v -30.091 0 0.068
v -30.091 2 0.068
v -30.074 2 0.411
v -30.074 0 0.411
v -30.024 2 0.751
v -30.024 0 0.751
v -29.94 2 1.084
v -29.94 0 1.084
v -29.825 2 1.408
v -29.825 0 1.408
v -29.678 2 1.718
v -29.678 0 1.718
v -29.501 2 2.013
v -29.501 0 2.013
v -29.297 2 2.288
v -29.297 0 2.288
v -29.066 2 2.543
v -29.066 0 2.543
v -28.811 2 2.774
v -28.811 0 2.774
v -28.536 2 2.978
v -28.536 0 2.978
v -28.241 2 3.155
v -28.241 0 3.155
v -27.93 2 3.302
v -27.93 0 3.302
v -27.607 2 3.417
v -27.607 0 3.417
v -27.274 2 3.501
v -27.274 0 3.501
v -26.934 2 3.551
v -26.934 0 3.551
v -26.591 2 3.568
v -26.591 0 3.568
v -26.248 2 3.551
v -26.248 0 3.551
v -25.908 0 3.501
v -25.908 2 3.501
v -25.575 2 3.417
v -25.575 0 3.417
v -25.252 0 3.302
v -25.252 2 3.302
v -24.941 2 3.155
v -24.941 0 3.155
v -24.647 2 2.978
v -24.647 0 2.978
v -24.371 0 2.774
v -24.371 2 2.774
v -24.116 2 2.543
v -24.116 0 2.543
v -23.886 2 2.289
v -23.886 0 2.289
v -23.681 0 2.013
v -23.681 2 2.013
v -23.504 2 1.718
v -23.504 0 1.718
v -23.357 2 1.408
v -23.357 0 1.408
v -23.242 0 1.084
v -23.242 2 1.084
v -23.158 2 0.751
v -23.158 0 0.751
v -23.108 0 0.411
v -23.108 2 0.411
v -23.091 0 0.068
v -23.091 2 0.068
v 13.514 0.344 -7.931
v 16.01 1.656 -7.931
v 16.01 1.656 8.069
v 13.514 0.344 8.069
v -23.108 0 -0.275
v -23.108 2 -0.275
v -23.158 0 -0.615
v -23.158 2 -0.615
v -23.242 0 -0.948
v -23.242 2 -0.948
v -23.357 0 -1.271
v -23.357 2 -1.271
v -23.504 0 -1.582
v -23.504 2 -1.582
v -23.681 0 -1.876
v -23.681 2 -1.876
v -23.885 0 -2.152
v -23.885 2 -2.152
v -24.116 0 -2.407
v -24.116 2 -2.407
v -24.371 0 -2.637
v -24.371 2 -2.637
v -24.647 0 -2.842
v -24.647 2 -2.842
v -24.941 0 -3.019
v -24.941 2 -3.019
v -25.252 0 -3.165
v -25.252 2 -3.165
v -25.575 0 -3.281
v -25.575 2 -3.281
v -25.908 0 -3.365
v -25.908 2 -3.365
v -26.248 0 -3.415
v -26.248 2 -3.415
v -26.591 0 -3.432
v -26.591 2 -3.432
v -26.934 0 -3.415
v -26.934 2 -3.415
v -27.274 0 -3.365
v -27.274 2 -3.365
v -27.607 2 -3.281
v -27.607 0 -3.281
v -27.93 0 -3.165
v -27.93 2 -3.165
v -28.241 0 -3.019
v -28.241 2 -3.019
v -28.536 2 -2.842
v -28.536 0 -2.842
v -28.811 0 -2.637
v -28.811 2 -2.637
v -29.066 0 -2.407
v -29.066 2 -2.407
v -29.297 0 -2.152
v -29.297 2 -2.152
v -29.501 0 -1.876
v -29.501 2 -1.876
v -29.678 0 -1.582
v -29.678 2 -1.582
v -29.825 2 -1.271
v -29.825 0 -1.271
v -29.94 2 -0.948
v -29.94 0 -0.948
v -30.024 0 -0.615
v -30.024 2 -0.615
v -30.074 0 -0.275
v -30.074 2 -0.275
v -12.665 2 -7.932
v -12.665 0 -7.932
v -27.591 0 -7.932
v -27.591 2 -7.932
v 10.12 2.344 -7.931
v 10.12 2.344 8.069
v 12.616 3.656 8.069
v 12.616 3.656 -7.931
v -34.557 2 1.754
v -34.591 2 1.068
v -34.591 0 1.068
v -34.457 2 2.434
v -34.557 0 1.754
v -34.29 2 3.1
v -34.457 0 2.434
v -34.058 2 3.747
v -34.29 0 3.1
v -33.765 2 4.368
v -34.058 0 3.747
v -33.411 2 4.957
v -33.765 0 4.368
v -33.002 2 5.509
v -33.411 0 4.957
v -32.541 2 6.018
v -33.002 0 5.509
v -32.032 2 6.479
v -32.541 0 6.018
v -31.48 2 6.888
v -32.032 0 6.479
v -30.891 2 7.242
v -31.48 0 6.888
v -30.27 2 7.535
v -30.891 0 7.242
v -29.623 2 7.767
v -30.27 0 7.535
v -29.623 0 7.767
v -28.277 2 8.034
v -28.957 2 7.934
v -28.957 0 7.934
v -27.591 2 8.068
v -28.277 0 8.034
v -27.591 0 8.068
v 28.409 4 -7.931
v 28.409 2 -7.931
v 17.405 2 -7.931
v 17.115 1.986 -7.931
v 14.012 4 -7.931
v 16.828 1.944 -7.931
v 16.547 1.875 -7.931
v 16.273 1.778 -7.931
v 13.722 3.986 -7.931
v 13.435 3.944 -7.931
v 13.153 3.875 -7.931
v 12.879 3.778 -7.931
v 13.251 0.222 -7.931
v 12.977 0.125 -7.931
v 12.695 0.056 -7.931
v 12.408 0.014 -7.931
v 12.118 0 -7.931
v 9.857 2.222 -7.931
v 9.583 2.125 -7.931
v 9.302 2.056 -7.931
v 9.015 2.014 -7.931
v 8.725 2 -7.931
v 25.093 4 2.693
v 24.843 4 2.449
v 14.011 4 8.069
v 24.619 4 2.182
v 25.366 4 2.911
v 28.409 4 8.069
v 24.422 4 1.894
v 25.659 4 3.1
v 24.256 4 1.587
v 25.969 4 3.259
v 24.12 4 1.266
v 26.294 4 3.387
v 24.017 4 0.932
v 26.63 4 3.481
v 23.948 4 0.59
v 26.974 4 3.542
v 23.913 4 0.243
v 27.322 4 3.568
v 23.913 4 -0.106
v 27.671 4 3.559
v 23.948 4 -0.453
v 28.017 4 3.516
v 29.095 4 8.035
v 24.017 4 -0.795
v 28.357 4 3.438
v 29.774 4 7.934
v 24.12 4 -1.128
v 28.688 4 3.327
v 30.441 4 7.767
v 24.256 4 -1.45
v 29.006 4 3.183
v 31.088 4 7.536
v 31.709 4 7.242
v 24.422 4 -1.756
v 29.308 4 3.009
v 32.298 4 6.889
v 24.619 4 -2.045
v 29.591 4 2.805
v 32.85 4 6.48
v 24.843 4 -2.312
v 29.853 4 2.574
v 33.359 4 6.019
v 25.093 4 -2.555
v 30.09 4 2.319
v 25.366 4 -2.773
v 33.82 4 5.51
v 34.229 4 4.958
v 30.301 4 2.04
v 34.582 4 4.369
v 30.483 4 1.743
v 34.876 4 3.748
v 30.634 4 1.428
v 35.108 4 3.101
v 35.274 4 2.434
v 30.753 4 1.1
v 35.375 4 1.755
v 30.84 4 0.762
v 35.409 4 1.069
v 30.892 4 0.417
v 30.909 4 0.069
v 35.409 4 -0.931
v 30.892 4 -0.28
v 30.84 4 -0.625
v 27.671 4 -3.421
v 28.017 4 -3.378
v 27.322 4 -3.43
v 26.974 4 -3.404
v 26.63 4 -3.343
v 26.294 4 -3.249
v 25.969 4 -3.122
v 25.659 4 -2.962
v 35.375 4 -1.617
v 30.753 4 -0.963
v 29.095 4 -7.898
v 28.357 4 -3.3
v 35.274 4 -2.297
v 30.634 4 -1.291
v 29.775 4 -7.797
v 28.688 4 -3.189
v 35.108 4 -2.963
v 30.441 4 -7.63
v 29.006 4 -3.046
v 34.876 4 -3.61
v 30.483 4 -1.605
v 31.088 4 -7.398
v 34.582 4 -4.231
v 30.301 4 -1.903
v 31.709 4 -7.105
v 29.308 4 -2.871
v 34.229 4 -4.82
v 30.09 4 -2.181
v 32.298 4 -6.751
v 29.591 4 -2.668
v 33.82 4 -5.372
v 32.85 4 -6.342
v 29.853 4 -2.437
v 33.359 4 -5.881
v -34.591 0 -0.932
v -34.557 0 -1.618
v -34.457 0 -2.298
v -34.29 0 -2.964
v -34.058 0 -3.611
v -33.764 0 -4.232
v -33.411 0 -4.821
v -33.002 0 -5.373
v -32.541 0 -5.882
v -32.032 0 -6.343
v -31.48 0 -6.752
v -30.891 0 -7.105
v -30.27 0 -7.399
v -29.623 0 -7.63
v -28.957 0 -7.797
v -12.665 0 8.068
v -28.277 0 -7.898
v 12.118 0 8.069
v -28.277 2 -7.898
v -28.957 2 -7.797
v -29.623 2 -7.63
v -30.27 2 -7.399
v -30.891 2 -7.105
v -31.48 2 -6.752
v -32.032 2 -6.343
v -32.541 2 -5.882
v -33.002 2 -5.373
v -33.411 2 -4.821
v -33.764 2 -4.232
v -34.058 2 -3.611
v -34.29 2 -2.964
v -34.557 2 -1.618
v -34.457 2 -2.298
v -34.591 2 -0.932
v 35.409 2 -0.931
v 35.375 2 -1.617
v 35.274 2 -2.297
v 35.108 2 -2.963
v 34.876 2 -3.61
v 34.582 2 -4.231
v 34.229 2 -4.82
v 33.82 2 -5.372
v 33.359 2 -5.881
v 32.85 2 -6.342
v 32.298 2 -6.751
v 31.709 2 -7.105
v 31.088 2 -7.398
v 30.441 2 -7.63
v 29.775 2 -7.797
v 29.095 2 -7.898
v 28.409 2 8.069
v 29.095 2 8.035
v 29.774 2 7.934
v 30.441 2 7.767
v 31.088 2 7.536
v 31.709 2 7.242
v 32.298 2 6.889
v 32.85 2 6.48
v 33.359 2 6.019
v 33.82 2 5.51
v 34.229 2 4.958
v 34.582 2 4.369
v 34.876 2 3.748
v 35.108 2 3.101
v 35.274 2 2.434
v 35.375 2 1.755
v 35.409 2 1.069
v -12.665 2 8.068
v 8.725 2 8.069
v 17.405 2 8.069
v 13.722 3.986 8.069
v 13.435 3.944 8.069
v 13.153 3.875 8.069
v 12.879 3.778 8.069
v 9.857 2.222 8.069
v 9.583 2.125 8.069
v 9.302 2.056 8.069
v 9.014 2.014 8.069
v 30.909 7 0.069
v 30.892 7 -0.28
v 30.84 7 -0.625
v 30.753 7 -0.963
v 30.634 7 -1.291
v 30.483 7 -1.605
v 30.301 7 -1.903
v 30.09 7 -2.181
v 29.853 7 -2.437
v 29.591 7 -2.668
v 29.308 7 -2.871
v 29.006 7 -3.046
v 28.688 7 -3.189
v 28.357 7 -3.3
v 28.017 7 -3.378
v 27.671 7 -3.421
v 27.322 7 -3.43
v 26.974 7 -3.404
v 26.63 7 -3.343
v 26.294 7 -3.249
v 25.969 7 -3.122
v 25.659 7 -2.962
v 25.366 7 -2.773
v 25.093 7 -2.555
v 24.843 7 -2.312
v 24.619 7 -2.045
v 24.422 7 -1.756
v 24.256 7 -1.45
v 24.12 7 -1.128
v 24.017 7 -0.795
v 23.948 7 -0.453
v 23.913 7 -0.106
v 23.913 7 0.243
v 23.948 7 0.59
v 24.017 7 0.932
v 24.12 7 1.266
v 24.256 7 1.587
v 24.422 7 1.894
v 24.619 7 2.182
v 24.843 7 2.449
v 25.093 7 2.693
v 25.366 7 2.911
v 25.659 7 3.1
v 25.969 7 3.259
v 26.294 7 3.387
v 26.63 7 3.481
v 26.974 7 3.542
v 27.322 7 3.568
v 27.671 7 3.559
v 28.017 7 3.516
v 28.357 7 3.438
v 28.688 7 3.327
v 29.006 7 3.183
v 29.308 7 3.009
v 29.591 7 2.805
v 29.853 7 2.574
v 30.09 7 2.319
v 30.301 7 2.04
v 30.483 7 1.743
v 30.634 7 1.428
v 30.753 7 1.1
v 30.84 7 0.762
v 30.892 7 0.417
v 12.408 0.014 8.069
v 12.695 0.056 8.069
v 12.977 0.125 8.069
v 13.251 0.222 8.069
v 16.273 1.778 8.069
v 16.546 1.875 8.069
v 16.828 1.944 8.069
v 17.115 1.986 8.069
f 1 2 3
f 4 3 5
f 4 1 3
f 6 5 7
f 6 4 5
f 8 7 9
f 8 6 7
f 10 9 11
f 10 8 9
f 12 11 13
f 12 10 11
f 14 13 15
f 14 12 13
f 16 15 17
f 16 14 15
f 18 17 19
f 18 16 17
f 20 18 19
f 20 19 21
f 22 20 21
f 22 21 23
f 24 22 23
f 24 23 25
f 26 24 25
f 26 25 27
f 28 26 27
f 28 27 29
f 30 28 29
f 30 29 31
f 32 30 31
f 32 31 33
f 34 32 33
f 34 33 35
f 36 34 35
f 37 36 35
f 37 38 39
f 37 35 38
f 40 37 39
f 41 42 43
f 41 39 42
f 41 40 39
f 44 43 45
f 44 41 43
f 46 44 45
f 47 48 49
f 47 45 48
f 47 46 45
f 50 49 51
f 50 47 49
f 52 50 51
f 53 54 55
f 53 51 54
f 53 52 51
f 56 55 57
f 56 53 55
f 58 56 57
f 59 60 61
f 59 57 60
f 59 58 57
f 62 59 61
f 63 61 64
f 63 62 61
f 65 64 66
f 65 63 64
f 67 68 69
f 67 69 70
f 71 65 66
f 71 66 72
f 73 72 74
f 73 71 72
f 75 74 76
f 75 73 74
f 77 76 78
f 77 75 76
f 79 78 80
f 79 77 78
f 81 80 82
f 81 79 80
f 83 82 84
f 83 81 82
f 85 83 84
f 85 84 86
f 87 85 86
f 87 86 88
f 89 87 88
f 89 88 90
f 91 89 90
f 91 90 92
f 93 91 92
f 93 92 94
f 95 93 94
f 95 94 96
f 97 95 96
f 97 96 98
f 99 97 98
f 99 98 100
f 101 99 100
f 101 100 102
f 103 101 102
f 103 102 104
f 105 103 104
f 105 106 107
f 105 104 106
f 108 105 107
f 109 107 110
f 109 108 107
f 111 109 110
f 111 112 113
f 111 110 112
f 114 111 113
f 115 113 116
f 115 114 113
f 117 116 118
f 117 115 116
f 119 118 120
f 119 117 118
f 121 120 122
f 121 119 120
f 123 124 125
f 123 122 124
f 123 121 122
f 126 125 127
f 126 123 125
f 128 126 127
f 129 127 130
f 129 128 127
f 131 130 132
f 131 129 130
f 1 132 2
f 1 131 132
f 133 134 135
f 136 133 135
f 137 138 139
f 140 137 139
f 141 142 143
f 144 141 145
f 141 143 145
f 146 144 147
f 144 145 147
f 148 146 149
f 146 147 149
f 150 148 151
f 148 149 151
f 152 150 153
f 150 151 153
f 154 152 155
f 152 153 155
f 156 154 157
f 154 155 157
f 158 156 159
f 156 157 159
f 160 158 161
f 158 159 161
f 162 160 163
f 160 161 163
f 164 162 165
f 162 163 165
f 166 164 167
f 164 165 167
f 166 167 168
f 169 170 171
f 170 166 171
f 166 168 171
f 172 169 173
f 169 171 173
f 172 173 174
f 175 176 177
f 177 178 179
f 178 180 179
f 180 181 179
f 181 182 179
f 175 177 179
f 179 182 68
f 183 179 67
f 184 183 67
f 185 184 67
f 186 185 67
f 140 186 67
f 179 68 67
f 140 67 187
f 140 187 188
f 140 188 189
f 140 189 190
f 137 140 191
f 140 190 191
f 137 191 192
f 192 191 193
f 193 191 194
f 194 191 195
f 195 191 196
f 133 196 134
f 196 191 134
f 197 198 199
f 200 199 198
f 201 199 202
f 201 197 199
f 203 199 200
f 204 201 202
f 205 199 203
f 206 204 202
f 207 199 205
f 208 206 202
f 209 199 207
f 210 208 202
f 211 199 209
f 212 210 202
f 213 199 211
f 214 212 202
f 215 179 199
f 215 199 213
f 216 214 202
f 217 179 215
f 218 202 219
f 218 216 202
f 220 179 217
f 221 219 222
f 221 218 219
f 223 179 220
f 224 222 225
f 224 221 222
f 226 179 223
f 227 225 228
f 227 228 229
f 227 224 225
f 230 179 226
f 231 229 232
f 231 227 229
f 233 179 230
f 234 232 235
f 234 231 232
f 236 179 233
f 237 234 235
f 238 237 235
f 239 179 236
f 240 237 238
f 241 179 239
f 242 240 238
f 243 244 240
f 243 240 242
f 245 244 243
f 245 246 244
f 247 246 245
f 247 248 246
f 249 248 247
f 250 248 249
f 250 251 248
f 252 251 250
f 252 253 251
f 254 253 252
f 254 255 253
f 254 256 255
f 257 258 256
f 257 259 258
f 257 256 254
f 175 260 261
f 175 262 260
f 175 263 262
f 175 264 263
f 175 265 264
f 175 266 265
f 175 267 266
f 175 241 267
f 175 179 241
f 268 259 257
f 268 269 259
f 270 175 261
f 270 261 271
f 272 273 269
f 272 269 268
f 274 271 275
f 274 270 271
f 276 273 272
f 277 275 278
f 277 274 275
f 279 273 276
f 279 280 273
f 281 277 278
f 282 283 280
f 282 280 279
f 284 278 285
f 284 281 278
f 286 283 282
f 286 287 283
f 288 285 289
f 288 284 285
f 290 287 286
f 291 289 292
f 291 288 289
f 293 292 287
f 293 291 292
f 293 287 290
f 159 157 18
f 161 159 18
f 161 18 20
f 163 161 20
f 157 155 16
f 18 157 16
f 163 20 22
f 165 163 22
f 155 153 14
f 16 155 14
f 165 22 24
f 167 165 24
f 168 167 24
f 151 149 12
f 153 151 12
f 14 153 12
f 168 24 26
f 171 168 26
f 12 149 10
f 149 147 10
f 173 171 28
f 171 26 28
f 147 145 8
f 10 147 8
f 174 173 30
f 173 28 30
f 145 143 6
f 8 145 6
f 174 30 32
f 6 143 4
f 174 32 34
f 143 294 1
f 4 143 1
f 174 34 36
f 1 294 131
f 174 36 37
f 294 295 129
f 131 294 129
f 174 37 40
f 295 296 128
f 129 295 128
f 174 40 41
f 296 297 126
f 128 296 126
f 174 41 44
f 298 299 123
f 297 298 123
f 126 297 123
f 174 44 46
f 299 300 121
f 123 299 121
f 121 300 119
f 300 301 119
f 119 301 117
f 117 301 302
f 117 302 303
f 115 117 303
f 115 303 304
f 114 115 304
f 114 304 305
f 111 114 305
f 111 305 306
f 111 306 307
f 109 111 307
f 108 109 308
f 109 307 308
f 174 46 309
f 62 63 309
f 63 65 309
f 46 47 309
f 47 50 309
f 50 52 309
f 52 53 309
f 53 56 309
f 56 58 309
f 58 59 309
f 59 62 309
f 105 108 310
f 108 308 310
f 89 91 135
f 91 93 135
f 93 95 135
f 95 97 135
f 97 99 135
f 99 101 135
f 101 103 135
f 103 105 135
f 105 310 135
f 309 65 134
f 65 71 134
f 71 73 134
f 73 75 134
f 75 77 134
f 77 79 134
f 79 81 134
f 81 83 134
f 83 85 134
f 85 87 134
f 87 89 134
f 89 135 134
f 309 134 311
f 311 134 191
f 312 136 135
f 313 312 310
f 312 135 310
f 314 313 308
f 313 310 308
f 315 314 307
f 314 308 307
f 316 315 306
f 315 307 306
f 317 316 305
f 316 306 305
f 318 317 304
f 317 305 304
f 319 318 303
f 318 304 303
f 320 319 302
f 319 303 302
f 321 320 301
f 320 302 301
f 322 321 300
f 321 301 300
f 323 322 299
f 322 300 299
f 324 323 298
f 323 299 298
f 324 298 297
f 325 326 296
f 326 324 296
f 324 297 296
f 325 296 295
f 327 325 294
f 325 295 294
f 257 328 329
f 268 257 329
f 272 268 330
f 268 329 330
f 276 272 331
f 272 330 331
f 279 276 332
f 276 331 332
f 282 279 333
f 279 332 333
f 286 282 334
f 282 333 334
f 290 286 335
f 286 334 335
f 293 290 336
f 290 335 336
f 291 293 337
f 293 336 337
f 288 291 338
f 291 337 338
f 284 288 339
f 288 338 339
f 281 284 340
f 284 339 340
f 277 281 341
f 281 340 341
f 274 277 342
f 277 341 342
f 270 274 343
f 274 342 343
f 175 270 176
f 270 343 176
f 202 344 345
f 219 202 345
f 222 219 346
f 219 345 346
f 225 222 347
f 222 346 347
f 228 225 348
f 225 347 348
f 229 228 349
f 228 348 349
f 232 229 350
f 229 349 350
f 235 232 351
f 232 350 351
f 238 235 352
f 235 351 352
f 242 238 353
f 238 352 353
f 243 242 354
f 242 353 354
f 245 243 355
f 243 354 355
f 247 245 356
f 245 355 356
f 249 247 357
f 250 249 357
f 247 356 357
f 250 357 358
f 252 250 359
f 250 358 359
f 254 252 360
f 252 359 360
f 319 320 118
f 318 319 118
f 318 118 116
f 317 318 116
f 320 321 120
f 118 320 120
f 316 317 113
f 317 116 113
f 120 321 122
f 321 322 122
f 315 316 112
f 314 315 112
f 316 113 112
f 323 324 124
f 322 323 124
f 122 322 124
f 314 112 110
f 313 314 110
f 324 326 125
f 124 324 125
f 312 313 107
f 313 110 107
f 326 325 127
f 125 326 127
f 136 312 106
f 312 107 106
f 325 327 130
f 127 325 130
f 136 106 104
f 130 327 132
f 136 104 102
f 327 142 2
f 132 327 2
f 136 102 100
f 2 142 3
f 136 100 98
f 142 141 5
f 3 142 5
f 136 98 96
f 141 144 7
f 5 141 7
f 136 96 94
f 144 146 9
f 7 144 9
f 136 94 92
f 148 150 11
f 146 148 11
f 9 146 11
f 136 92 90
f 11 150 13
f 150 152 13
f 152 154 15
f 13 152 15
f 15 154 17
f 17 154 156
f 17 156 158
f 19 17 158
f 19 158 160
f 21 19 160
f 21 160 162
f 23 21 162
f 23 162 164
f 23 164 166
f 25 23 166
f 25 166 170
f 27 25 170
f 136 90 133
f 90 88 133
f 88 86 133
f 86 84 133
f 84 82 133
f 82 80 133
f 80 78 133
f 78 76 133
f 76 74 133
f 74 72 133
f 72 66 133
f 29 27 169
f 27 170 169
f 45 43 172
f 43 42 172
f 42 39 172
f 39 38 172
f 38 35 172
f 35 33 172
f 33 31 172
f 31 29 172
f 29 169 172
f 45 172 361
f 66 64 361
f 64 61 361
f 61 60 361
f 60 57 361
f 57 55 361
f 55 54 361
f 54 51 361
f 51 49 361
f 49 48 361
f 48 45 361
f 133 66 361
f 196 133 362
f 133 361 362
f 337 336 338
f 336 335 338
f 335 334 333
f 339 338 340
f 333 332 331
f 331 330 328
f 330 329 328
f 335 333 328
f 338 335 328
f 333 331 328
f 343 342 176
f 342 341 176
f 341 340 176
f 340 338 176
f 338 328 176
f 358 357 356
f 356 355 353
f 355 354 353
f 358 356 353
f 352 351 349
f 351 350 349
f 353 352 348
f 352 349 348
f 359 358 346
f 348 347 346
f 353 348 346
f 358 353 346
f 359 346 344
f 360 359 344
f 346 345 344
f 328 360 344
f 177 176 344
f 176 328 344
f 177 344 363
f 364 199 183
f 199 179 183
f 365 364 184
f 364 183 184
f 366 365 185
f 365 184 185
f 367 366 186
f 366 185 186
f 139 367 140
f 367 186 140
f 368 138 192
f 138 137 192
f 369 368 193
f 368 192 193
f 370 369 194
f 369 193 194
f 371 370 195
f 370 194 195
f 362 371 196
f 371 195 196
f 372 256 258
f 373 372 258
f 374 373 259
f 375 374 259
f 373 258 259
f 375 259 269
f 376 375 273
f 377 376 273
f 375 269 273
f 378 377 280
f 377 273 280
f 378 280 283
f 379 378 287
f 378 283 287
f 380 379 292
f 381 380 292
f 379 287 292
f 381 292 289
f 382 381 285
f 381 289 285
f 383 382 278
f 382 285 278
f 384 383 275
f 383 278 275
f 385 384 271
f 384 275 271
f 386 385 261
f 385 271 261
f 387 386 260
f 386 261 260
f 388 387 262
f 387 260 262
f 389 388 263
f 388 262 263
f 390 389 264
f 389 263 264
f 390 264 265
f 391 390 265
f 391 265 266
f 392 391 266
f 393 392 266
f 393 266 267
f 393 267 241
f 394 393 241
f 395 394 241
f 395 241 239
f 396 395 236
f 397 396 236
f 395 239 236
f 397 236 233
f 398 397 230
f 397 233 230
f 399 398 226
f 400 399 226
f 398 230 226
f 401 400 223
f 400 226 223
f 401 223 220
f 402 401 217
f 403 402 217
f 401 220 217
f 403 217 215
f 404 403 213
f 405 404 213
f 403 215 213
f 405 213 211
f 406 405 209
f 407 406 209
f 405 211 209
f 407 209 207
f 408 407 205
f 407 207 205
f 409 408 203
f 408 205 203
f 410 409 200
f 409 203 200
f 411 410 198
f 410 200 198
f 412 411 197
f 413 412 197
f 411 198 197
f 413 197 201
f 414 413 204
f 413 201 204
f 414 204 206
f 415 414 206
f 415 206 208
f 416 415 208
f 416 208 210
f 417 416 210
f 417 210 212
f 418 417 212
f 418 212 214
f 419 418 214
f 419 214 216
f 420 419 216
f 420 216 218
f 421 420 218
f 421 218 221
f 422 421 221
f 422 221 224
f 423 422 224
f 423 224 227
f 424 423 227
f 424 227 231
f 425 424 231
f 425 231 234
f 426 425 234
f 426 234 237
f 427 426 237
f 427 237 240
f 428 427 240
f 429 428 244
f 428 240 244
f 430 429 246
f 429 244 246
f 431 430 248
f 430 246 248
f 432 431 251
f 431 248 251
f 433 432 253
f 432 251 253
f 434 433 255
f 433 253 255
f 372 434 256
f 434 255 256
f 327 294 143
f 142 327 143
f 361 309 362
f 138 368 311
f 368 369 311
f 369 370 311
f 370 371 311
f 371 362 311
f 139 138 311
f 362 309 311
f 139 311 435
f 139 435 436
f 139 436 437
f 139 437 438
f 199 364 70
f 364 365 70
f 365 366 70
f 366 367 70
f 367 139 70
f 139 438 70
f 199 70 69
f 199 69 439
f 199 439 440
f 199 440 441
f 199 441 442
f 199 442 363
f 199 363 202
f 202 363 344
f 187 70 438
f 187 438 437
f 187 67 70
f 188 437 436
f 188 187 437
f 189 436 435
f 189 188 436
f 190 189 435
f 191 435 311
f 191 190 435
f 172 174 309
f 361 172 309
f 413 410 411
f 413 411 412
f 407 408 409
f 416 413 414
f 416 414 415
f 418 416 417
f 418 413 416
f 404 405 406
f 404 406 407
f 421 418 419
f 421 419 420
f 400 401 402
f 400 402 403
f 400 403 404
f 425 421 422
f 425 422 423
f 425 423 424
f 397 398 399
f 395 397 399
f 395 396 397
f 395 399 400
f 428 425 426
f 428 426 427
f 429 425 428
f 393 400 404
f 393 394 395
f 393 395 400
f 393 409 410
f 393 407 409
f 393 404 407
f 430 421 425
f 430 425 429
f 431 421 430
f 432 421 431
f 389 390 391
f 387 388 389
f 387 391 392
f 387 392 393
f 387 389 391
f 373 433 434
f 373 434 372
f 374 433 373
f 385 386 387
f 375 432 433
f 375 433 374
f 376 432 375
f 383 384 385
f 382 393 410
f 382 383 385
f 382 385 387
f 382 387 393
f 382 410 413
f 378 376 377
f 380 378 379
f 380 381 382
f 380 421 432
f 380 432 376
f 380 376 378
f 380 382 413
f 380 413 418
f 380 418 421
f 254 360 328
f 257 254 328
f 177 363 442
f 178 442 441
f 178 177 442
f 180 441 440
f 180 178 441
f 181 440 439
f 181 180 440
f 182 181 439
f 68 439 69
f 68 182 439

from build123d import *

# Parameters (mm, degrees)
BOSS_EXTRUDE1_DEPTH = 4
SKETCH4_W           = 7
SKETCH4_H           = 2
CUT_EXTRUDE2_DEPTH  = 17.000717669
FILLET1_R           = 3
SKETCH5_R           = 3.5
BOSS_EXTRUDE2_DEPTH = 3


with BuildPart() as part:
    # Sketch1 → Boss-Extrude1 (new body)
    with BuildSketch(Plane(origin=(0, 0, 0), x_dir=(1, 0, 0), z_dir=(0, 1, 0))):
        with BuildLine():
            Line((35.408940815, -1.068857927), (35.408963598, 0.931142073))
            ThreePointArc((35.408963598, 0.931142073), (33.358767452, 5.880912897), (28.40904334, 7.931221814))
            Line((28.40904334, 7.931221814), (-12.665132622, 7.931689714))
            Line((-12.665132622, 7.931689714), (-27.590956657, 7.931859742))
            ThreePointArc((-27.590956657, 7.931859742), (-32.54072748, 5.881663596), (-34.591036397, 0.931939484))
            Line((-34.591036397, 0.931939484), (-34.591059181, -1.068060516))
            ThreePointArc((-34.591059181, -1.068060516), (-32.540863035, -6.01783134), (-27.591138922, -8.068140257))
            Line((-27.591138922, -8.068140257), (-12.665314887, -8.068310285))
            Line((-12.665314887, -8.068310285), (28.408861074, -8.068778185))
            ThreePointArc((28.408861074, -8.068778185), (33.358631898, -6.018582039), (35.408940815, -1.068857927))
        make_face()
        with BuildLine():
            ThreePointArc((27.408912336, -3.568766794), (30.908952207, -0.068806665), (27.408992077, 3.431233206))
            ThreePointArc((27.408992077, 3.431233206), (23.908952207, -0.068726924), (27.408912336, -3.568766794))
        make_face(mode=Mode.SUBTRACT)
        with BuildLine():
            ThreePointArc((-23.09104779, -0.068191519), (-26.591007919, 3.431848351), (-30.091047789, -0.068111778))
            ThreePointArc((-30.091047789, -0.068111778), (-26.59108766, -3.568151649), (-23.09104779, -0.068191519))
        make_face(mode=Mode.SUBTRACT)
        with BuildLine():
            ThreePointArc((27.408992077, 3.431233206), (23.908952207, -0.068726924), (27.408912336, -3.568766794))
            ThreePointArc((27.408912336, -3.568766794), (30.908952207, -0.068806665), (27.408992077, 3.431233206))
        make_face()
    extrude(amount=BOSS_EXTRUDE1_DEPTH)

    # Sketch4 → Cut-Extrude2 (cut, through all)
    with BuildSketch(Plane(origin=(-9.1912e-05, 0, 8.068454562), x_dir=(1, 0, 1.1392e-05), z_dir=(-1.1392e-05, 0, 1))):
        Polygon((9.464868883, 2), (13.271442145, 4), (-27.591047011, 4), (-27.591047011, 2), align=None)
        with Locations((-31.091047011, 3)):
            Rectangle(SKETCH4_W, SKETCH4_H)
        Polygon((28.408952989, 0), (28.408952989, 2), (16.665047436, 2), (12.858474174, 0), align=None)
        with Locations((31.908952989, 1)):
            Rectangle(SKETCH4_W, SKETCH4_H)
    extrude(amount=-CUT_EXTRUDE2_DEPTH, mode=Mode.SUBTRACT)

    # Fillet1
    fillet1_edges = [part.edges().sort_by_distance(p)[0] for p in [
        (12.858473393, 0, 0.068601041),
        (13.271441364, 4, 0.068605746),
        (16.665046655, 2, 0.068644404),
        (9.464868102, 2, 0.068562383),
    ]]
    fillet(fillet1_edges, radius=FILLET1_R)

    # Sketch5 → Boss-Extrude2 (add)
    with BuildSketch(Plane(origin=(0, 4, 0), x_dir=(1, 0, 0), z_dir=(0, 1, 0))):
        with Locations((27.408952207, -0.068766794)):
            Circle(SKETCH5_R)
    extrude(amount=BOSS_EXTRUDE2_DEPTH)


solid = part.part
